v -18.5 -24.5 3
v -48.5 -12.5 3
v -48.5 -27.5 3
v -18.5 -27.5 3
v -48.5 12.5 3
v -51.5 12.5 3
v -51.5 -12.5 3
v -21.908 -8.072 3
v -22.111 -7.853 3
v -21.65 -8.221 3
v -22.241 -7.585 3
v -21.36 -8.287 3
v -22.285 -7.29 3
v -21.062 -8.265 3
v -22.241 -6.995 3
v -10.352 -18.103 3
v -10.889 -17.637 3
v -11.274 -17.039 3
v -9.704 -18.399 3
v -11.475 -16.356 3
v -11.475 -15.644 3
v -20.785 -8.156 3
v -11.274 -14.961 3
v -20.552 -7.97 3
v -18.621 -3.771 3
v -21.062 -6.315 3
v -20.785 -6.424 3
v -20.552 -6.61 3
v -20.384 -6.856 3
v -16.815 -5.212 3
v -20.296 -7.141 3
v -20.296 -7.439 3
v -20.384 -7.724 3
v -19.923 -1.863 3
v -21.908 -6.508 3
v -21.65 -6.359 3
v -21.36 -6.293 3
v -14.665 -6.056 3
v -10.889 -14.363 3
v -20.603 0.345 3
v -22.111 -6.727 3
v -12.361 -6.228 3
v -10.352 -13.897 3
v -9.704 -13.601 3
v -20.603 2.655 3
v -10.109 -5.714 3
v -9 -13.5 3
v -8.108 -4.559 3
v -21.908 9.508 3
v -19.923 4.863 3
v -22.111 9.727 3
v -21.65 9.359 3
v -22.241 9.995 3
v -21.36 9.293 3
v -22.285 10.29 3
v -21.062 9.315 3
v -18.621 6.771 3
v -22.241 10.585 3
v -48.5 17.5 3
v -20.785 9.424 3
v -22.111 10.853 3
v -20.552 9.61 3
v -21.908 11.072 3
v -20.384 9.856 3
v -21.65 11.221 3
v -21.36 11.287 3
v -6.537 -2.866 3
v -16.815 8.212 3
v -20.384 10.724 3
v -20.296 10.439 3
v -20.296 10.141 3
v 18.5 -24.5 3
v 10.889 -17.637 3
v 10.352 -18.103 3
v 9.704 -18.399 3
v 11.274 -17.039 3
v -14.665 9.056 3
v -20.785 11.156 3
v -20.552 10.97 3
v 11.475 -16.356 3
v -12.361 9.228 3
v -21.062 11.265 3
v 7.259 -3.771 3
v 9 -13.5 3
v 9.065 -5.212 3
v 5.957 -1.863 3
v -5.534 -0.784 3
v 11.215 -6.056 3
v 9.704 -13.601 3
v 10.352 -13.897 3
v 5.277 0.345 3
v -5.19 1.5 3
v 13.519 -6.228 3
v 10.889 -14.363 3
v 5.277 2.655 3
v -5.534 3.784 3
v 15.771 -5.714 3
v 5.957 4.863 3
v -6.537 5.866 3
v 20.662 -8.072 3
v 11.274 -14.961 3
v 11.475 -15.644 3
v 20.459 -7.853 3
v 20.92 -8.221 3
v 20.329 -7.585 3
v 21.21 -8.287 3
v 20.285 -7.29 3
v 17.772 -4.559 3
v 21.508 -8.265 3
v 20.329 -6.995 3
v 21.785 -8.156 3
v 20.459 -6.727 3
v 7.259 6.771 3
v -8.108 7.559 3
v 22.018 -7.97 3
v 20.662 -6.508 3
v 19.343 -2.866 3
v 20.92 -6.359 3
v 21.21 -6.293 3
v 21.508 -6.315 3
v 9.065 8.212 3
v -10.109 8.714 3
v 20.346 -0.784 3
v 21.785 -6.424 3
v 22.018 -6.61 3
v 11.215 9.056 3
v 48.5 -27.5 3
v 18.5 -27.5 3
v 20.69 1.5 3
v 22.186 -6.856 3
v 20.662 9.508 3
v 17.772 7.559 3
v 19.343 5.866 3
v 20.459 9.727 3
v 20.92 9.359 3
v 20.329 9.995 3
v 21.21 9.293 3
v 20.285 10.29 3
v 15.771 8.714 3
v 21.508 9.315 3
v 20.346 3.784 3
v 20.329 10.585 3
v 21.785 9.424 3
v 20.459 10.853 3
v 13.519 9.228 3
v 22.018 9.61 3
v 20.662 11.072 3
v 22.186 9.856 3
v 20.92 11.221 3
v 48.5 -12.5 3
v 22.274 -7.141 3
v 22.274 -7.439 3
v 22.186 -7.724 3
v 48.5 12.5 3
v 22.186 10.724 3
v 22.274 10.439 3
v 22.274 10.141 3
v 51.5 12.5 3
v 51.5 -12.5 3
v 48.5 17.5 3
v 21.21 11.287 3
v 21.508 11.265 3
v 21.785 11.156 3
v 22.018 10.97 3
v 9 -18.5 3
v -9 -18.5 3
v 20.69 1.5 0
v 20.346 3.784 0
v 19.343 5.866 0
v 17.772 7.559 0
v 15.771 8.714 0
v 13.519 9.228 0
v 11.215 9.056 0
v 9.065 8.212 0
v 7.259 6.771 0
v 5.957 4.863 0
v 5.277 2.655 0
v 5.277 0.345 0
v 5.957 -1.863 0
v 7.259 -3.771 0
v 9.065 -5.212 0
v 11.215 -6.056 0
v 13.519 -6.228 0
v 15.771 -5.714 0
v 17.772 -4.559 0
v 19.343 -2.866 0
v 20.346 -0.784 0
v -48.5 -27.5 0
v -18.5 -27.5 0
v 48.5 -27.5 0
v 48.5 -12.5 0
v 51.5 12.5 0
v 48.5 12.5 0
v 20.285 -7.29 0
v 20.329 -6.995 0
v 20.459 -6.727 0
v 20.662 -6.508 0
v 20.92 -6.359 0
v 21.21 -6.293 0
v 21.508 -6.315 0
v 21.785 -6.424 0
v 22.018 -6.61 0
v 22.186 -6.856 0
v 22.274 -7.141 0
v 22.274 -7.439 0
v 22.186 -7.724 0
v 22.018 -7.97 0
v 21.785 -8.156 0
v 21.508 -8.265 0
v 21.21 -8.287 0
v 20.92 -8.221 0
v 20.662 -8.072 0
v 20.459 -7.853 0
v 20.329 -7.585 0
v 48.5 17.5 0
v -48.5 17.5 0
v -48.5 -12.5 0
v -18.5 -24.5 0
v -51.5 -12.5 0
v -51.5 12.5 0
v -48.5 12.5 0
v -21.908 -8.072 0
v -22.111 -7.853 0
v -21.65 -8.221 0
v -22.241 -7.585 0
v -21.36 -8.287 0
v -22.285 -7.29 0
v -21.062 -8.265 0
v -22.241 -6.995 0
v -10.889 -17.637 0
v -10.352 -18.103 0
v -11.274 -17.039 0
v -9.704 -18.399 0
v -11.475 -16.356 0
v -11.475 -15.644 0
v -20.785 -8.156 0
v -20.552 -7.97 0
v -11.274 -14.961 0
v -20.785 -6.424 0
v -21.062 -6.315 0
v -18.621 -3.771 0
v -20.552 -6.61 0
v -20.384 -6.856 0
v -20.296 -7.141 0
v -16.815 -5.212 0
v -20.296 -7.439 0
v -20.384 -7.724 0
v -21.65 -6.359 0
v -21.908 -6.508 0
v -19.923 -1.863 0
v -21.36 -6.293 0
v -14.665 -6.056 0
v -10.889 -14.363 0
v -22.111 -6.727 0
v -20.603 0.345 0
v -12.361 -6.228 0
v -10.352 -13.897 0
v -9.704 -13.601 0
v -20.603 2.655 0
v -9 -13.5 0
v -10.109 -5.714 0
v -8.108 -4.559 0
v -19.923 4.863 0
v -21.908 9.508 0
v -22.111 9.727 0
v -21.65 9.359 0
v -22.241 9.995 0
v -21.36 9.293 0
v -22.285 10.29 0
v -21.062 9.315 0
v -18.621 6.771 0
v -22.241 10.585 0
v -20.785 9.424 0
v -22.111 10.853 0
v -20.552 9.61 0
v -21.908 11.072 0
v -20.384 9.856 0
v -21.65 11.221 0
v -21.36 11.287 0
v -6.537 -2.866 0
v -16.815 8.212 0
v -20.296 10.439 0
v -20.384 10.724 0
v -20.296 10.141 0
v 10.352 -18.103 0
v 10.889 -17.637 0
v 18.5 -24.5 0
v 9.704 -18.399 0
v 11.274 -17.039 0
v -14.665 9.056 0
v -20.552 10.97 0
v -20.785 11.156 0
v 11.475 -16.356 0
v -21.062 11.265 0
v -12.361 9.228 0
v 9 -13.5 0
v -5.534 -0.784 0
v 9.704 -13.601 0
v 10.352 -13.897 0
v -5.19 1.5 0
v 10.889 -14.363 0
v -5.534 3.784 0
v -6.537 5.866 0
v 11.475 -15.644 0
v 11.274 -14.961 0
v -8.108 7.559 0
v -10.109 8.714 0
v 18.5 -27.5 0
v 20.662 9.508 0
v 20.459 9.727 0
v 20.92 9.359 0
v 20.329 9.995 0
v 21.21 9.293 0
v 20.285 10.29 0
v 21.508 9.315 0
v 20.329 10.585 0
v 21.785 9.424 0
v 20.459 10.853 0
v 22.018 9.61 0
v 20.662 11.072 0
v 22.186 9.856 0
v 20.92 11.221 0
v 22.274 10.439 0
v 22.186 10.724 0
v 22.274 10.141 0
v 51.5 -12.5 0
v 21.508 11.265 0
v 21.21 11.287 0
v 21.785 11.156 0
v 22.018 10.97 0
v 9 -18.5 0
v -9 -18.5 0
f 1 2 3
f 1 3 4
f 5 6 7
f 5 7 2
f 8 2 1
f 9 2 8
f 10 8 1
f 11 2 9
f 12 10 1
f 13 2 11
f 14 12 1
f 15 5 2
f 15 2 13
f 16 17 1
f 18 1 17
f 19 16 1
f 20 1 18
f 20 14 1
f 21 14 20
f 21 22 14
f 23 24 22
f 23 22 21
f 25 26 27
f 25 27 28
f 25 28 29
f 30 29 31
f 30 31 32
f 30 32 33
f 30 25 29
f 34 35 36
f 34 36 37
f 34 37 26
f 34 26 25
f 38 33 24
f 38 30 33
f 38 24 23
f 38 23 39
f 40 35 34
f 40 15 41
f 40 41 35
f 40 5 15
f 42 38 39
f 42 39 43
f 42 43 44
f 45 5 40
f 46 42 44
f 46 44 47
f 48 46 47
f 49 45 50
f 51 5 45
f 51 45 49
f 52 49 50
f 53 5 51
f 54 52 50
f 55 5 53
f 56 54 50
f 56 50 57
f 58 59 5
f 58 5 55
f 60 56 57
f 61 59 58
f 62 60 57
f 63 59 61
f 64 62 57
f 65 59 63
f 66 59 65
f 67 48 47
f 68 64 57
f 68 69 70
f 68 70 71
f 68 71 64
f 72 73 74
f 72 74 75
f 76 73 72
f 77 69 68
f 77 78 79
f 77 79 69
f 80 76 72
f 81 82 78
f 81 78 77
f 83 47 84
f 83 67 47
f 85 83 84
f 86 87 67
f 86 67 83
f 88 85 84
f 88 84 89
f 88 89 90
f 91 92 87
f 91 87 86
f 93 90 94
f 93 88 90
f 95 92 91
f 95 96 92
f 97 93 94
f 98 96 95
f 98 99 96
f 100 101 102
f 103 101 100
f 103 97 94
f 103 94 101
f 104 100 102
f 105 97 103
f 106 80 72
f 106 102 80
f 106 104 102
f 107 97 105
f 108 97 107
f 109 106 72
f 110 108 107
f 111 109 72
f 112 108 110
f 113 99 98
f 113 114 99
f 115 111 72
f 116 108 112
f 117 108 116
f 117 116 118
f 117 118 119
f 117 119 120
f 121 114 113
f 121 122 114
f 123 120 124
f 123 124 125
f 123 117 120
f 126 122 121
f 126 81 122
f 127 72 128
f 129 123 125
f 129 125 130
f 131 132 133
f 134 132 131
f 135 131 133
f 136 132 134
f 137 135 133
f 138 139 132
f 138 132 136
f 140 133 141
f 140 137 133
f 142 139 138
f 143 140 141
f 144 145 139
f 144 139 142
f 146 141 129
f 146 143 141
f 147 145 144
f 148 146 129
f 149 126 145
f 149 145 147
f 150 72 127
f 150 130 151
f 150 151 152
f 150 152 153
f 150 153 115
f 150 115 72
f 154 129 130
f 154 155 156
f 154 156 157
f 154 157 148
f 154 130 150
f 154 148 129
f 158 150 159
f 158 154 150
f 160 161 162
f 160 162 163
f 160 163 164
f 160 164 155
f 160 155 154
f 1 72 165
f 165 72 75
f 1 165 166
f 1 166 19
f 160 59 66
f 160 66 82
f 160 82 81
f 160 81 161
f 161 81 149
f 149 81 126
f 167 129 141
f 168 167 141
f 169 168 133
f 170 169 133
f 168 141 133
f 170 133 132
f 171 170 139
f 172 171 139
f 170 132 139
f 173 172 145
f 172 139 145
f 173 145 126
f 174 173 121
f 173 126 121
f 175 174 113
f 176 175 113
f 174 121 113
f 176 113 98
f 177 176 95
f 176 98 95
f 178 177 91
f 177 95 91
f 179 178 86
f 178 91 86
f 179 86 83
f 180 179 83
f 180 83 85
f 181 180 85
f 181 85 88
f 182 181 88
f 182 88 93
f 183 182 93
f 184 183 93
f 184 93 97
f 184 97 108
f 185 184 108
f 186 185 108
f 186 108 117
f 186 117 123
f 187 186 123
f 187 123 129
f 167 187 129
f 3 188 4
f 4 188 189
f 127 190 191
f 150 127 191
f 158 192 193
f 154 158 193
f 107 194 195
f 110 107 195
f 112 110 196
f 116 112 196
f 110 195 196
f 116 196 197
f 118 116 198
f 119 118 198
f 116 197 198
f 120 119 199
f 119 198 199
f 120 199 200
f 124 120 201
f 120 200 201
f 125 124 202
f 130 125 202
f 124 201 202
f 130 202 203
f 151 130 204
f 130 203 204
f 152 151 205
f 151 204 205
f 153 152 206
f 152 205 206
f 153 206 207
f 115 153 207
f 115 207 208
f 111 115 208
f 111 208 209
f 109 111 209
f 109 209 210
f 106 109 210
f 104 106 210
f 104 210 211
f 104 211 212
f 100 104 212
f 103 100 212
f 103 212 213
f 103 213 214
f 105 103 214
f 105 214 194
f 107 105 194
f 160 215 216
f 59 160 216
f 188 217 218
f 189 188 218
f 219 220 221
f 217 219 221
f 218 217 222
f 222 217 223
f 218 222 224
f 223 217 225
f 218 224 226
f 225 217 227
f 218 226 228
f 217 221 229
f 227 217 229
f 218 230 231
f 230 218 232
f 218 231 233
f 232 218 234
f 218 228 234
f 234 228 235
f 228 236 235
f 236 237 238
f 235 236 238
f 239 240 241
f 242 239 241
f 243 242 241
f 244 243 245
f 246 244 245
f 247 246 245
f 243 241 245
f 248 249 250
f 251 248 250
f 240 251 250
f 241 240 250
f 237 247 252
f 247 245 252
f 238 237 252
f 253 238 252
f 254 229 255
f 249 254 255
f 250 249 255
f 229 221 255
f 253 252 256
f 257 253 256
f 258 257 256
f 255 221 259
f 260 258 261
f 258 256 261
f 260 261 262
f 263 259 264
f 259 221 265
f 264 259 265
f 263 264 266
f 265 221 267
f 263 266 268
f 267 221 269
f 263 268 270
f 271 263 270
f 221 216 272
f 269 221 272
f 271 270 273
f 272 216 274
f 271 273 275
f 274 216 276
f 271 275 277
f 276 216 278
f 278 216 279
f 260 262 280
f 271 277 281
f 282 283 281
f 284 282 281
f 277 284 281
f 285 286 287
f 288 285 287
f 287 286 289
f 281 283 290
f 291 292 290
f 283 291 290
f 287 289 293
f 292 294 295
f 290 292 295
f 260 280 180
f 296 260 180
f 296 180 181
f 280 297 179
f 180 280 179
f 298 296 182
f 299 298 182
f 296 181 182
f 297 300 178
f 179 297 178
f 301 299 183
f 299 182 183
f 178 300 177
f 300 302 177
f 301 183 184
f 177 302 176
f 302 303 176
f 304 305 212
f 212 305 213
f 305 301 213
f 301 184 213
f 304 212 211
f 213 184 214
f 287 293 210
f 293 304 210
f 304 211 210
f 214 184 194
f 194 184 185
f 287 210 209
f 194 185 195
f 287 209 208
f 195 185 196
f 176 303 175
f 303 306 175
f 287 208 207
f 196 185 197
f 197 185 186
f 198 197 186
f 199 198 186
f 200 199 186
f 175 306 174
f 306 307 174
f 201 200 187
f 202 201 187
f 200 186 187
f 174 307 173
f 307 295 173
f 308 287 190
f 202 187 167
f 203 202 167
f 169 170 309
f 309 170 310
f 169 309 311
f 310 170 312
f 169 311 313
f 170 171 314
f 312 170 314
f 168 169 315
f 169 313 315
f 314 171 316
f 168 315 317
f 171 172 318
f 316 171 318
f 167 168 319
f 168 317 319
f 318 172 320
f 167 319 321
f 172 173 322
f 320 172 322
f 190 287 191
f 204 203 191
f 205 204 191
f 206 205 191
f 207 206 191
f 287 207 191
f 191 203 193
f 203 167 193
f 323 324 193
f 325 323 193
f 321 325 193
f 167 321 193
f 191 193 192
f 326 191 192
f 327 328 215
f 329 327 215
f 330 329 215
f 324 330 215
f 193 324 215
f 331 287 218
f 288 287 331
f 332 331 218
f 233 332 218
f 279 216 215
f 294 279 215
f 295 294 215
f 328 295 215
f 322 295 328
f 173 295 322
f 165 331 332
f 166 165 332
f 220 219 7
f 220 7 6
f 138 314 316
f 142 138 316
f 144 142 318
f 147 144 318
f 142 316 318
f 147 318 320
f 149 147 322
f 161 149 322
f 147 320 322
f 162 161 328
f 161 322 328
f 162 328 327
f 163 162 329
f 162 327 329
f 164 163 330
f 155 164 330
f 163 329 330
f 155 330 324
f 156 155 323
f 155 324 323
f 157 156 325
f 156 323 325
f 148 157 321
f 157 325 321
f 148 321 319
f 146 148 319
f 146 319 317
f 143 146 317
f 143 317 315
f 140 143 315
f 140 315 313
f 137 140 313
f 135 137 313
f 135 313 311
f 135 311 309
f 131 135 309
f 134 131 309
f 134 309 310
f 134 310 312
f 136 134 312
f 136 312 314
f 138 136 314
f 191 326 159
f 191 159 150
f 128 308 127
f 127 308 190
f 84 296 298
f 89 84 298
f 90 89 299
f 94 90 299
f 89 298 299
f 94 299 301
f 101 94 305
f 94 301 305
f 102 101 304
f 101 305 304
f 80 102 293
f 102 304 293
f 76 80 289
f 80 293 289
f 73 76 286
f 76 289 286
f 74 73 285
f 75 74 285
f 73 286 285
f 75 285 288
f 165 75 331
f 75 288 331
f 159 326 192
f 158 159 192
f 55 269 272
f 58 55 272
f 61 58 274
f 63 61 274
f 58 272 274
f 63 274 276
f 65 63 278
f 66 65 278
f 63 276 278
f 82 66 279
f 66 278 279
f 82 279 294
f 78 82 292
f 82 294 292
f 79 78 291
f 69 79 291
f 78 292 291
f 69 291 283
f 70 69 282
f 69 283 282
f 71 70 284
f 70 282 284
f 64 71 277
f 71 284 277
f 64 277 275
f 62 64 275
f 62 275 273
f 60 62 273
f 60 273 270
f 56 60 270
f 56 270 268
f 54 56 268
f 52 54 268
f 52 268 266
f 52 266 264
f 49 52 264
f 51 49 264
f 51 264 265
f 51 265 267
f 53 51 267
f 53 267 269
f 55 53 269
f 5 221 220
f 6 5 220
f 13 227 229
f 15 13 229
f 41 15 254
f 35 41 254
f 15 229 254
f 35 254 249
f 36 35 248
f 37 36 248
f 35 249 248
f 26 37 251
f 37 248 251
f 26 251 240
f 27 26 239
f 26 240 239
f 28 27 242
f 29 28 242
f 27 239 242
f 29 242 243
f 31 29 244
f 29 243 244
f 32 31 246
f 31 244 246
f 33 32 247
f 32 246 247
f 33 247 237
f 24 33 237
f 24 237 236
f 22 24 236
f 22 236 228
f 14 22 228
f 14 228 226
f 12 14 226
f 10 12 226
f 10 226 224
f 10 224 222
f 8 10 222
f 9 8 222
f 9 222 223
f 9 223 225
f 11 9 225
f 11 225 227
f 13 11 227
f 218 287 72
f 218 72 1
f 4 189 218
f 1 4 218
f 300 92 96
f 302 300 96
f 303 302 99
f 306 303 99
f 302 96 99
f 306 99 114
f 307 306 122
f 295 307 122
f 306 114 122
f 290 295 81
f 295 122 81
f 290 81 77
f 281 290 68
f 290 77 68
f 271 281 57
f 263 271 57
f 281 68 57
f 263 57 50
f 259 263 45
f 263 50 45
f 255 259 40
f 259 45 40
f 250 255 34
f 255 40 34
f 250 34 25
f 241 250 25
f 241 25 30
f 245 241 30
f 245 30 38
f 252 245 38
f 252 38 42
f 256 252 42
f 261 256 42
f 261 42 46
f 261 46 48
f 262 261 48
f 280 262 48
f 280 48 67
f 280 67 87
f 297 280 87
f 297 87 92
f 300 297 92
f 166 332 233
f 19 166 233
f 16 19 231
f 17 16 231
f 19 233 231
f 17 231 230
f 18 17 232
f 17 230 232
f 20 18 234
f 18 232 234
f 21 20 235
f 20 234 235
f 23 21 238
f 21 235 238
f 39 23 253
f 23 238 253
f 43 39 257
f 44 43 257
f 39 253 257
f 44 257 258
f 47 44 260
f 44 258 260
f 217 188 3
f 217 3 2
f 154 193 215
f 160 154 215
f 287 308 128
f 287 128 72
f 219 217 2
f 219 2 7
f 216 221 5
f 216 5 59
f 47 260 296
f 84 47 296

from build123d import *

# Parameters (mm, degrees)
ESBO_O1_W                = 103
ESBO_O1_H                = 55
RESSALTO_EXTRUS_O1_DEPTH = 3
ESBO_O2_W                = 3
ESBO_O2_H                = 15
CORTE_EXTRUS_O1_DEPTH    = 59.459387612
ESBO_O3_W                = 37
ESBO_O3_H                = 3
CORTE_EXTRUS_O2_DEPTH    = 59.459387612
ESBO_O4_W                = 97
ESBO_O4_H                = 10
CORTE_EXTRUS_O3_DEPTH    = 10
ESBO_O5_R                = 7.75
CORTE_EXTRUS_O4_DEPTH    = 59.459387612
CORTE_EXTRUS_O5_DEPTH    = 59.459387612
ESBO_O10_R               = 1
CORTE_EXTRUS_O6_DEPTH    = 59.459387612


with BuildPart() as part:
    # Esboço1 → Ressalto-extrusão1 (new body)
    with BuildSketch(Plane.XY):
        Rectangle(ESBO_O1_W, ESBO_O1_H)
    extrude(amount=RESSALTO_EXTRUS_O1_DEPTH)

    # Esboço2 → Corte-extrusão1 (cut, through all)
    with BuildSketch(Plane(origin=(0, 0, 0), x_dir=(-1, 0, 0), z_dir=(0, 0, -1))):
        with Locations((-50, 20)):
            Rectangle(ESBO_O2_W, ESBO_O2_H)
        with Locations((-50, -20)):
            Rectangle(ESBO_O2_W, ESBO_O2_H)
        with Locations((50, 20)):
            Rectangle(ESBO_O2_W, ESBO_O2_H)
        with Locations((50, -20)):
            Rectangle(ESBO_O2_W, ESBO_O2_H)
    extrude(amount=-CORTE_EXTRUS_O1_DEPTH, mode=Mode.SUBTRACT)

    # Esboço3 → Corte-extrusão2 (cut, through all)
    with BuildSketch(Plane(origin=(0, 0, 0), x_dir=(-1, 0, 0), z_dir=(0, 0, -1))):
        with Locations((0, -26)):
            Rectangle(ESBO_O3_W, ESBO_O3_H)
    extrude(amount=-CORTE_EXTRUS_O2_DEPTH, mode=Mode.SUBTRACT)

    # Esboço4 → Corte-extrusão3 (cut)
    with BuildSketch(Plane(origin=(0, 0, 0), x_dir=(-1, 0, 0), z_dir=(0, 0, -1))):
        with Locations((0, 22.5)):
            Rectangle(ESBO_O4_W, ESBO_O4_H)
    extrude(amount=-CORTE_EXTRUS_O3_DEPTH, mode=Mode.SUBTRACT)

    # Esboço5 → Corte-extrusão4 (cut, through all)
    with BuildSketch(Plane.XY.offset(3)):
        with Locations((-12.94, 1.5)):
            Circle(ESBO_O5_R)
        with Locations((12.94, 1.5)):
            Circle(ESBO_O5_R)
    extrude(amount=-CORTE_EXTRUS_O4_DEPTH, mode=Mode.SUBTRACT)

    # Esboço6 → Corte-extrusão5 (cut, through all)
    with BuildSketch(Plane(origin=(0, 0, 0), x_dir=(-1, 0, 0), z_dir=(0, 0, -1))):
        with BuildLine():
            Line((-9, -18.5), (9, -18.5))
            ThreePointArc((9, -18.5), (11.5, -16), (9, -13.5))
            Line((9, -13.5), (-9, -13.5))
            ThreePointArc((-9, -13.5), (-11.5, -16), (-9, -18.5))
        make_face()
    extrude(amount=-CORTE_EXTRUS_O5_DEPTH, mode=Mode.SUBTRACT)

    # Esboço10 → Corte-extrusão6 (cut, through all)
    with BuildSketch(Plane(origin=(0, 0, 0), x_dir=(-1, 0, 0), z_dir=(0, 0, -1))):
        with Locations((-21.285, 10.29)):
            Circle(ESBO_O10_R)
        with Locations((-21.285, -7.29)):
            Circle(ESBO_O10_R)
        with Locations((21.285, -7.29)):
            Circle(ESBO_O10_R)
        with Locations((21.285, 10.29)):
            Circle(ESBO_O10_R)
    extrude(amount=-CORTE_EXTRUS_O6_DEPTH, mode=Mode.SUBTRACT)


solid = part.part
